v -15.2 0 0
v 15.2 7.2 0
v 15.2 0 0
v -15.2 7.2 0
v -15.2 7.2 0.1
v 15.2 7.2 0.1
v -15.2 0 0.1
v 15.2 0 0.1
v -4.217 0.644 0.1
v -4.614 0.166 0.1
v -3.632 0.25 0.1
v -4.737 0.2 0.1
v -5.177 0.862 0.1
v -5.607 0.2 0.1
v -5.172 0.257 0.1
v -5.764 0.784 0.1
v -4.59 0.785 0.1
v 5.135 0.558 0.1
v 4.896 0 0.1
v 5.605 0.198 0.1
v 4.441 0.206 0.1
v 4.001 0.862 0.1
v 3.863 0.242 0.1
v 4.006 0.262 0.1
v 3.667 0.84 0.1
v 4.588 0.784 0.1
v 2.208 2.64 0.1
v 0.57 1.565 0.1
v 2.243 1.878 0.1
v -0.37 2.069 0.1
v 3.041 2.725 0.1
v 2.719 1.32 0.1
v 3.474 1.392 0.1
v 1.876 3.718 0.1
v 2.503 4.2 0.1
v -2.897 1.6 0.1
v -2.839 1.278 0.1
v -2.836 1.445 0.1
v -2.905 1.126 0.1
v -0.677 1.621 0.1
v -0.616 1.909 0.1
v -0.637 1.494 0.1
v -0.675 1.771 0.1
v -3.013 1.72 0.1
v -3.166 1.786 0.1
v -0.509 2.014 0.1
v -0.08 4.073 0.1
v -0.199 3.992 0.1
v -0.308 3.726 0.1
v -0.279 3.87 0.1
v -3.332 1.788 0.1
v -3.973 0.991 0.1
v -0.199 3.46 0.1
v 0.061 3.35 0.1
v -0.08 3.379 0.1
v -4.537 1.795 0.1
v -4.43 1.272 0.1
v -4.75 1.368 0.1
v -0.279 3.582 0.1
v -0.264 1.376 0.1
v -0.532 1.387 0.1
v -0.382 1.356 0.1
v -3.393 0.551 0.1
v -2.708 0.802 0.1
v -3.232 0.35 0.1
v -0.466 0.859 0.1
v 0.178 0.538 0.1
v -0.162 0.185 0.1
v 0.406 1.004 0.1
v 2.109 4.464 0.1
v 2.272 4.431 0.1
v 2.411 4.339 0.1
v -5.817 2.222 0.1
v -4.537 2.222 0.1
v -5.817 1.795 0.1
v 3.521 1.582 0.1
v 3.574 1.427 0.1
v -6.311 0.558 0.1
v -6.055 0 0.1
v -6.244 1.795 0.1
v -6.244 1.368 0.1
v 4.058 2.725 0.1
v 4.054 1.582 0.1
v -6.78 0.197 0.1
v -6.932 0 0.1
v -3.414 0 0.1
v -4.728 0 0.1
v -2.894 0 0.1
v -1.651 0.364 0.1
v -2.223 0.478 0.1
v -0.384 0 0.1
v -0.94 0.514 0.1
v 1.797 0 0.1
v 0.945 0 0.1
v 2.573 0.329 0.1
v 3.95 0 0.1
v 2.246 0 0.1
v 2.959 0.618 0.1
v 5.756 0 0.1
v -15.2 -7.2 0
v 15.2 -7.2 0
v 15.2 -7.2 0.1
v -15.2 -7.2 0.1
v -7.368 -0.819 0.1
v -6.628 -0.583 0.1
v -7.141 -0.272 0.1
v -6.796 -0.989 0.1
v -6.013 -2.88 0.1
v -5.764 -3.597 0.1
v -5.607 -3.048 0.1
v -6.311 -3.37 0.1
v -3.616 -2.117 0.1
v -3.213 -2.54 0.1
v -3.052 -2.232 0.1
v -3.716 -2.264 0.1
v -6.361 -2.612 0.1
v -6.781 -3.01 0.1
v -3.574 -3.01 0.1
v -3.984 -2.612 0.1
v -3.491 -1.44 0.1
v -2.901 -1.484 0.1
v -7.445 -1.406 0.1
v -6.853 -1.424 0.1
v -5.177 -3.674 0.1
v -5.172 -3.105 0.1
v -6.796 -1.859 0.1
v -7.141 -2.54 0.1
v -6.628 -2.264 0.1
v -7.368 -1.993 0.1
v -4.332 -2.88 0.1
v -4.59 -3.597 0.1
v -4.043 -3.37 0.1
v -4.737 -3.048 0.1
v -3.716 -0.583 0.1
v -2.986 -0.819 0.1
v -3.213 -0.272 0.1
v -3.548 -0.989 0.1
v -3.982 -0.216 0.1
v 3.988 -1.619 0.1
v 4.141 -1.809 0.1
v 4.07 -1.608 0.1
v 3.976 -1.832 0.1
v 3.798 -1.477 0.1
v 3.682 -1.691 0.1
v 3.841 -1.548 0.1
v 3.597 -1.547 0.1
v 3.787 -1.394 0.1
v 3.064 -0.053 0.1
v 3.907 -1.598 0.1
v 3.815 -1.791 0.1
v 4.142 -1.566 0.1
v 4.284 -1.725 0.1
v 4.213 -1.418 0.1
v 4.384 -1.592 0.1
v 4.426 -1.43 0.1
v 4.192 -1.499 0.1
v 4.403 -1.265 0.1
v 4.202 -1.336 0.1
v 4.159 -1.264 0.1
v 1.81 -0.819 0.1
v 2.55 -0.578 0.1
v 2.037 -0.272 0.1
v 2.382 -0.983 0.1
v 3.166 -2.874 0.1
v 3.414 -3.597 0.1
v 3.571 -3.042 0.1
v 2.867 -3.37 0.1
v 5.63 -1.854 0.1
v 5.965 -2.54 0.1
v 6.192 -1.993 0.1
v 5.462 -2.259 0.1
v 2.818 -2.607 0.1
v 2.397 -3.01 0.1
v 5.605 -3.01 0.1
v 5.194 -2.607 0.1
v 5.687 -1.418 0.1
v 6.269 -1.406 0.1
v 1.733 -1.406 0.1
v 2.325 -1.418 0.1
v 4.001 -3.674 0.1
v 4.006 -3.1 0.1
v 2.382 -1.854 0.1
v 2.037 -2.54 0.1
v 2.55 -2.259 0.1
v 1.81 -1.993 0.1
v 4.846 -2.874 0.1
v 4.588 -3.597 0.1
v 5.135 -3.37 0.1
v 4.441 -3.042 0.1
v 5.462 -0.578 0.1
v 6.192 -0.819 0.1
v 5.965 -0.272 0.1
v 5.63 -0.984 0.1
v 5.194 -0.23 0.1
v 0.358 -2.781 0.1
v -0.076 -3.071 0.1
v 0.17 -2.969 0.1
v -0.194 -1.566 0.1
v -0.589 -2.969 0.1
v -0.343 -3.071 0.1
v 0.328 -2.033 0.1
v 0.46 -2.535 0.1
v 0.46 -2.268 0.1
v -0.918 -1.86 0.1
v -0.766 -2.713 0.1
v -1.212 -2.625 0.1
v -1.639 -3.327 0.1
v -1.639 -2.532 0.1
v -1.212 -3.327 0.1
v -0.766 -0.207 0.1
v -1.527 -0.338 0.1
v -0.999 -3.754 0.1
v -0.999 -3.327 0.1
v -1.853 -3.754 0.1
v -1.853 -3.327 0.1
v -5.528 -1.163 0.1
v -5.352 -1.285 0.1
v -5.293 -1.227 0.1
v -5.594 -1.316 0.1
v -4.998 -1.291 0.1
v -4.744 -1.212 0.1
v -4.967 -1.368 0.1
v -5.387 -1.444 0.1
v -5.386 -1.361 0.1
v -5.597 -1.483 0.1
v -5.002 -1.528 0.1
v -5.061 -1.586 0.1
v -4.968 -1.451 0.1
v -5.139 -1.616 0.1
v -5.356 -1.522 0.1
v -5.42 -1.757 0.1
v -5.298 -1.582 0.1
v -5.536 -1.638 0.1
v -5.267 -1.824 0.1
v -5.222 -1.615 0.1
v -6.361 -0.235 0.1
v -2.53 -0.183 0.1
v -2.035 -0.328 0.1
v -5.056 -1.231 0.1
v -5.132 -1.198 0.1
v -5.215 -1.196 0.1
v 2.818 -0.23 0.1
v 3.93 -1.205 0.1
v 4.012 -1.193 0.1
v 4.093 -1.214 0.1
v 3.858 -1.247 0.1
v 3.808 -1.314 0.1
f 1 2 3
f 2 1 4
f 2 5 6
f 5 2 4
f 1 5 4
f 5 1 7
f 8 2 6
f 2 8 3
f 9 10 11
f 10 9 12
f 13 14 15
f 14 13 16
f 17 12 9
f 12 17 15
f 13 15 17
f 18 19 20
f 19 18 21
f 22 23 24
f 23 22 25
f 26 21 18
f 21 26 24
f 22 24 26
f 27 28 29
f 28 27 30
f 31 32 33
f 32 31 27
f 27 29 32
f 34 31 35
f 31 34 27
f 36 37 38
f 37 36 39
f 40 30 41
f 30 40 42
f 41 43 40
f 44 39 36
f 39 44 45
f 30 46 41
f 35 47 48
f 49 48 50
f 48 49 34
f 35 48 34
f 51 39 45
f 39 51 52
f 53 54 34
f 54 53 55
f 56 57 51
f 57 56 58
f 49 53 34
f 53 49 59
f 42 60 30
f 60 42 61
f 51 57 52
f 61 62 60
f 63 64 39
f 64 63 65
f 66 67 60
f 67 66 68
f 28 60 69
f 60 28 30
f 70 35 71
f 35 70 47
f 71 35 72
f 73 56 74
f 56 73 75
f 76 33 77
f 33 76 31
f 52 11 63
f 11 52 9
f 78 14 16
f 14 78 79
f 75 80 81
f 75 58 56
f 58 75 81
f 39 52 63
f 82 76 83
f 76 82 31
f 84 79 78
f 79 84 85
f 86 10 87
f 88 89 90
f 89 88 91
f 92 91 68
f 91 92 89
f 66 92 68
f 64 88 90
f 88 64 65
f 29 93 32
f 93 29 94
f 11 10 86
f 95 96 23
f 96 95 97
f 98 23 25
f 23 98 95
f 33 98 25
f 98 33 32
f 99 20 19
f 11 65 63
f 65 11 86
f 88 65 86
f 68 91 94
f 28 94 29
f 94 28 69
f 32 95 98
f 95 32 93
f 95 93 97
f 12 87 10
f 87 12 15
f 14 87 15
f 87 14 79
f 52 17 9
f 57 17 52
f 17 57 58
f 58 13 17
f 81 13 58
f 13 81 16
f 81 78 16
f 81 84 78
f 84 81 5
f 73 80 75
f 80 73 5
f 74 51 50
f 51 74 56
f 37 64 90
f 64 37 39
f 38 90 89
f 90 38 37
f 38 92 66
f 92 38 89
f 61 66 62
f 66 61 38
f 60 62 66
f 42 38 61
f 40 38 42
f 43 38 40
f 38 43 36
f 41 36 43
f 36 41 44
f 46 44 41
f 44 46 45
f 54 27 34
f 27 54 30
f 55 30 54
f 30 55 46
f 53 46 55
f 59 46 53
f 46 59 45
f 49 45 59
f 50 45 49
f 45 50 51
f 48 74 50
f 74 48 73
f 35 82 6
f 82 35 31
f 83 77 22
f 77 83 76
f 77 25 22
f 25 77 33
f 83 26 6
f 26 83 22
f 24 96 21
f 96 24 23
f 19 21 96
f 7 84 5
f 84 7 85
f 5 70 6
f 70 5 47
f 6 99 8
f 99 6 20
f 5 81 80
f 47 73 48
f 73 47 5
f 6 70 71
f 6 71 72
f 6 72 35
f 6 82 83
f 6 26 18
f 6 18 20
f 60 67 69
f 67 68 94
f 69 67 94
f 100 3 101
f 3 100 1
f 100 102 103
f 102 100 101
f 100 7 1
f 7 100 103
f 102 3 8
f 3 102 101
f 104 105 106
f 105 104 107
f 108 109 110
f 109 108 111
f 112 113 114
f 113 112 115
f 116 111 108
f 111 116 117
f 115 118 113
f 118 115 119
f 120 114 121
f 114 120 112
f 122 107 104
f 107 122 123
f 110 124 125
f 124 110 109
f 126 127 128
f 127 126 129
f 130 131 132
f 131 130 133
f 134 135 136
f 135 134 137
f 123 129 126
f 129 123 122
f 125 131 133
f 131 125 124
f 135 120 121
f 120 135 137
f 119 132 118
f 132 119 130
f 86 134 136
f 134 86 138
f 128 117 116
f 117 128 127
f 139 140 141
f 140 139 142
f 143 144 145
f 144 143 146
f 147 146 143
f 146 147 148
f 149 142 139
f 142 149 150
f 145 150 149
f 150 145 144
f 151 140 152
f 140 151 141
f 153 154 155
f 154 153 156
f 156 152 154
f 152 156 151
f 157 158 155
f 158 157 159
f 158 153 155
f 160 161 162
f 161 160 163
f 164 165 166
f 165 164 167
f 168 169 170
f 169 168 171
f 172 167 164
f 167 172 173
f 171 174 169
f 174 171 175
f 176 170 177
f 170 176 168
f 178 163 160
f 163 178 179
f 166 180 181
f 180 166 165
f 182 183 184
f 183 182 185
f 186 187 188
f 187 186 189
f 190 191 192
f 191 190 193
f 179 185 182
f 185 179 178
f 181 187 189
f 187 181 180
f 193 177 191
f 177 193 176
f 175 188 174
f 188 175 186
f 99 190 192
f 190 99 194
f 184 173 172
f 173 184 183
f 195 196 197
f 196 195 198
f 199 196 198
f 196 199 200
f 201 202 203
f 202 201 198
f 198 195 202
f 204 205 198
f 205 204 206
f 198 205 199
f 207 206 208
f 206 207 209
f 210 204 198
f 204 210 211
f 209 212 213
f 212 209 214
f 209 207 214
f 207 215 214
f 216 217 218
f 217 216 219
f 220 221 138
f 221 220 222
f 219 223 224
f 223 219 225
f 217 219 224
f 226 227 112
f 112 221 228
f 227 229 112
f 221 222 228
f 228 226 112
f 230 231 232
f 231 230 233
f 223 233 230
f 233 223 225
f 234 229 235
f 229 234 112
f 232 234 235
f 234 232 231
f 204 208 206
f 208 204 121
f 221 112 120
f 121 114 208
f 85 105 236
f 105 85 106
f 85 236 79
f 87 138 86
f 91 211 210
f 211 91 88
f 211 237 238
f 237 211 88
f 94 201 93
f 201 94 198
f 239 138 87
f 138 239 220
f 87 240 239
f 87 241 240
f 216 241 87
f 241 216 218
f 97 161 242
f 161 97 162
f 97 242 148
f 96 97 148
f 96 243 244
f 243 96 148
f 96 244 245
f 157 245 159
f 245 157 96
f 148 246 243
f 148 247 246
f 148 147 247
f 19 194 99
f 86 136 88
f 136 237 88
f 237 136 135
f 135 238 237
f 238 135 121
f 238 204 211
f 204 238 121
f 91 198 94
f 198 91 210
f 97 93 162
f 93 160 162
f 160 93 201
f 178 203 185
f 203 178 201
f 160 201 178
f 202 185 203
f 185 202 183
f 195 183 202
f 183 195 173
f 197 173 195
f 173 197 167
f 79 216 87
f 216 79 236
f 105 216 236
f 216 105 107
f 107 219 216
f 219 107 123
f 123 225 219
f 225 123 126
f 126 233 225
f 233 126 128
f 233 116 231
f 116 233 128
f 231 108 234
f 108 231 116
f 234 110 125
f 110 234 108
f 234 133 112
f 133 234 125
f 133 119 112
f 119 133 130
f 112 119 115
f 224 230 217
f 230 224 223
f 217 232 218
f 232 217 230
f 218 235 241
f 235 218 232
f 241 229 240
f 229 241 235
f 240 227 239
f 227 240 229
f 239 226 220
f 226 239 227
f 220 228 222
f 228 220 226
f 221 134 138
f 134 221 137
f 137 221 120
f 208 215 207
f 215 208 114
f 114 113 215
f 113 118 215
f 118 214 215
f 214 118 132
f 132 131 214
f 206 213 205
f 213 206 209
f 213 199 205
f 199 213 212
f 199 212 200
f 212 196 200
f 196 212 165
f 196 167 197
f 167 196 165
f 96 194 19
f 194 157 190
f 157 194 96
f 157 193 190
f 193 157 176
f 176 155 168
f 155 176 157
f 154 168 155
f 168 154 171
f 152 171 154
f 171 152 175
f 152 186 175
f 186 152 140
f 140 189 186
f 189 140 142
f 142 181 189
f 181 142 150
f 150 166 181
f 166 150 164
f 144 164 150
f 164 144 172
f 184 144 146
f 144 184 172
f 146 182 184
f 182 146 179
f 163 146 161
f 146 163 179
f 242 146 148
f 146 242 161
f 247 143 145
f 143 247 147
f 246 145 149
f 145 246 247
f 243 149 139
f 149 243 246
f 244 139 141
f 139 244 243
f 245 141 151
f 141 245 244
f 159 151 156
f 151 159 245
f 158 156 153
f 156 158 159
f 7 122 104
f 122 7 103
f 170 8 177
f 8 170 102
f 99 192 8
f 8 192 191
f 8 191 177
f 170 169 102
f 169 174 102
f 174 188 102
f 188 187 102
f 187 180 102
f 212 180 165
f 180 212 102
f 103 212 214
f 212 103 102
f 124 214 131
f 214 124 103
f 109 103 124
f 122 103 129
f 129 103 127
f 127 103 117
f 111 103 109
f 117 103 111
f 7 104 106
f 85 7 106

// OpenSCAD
// file: ../p/box4-12.scad
use <../lib.scad>
function ldraw_lib__box4_12() = [
// 0 Box with 4 Faces without Any Edges
// 0 Name: box4-12.dat
// 0 Author: J.C. Tchang [tchang]
// 0 !LDRAW_ORG Primitive UPDATE 2019-01
// 0 !LICENSE Licensed under CC BY 2.0 and CC BY 4.0 : see CAreadme.txt
// 
// 0 BFC CERTIFY CCW
  [0,"BFC","CERTIFY"],
  [0,"BFC","CCW"],
// 
// 0 !HISTORY 2019-06-28 [PTadmin] Official Update 2019-01
// 
// 
// 4 16 -1 1 1 1 1 1 1 1 -1 -1 1 -1
  [4,16,-1,1,1,1,1,1,1,1,-1,-1,1,-1],
// 4 16 -1 1 1 -1 0 1 1 0 1 1 1 1
  [4,16,-1,1,1,-1,0,1,1,0,1,1,1,1],
// 4 16 -1 1 -1 -1 0 -1 -1 0 1 -1 1 1
  [4,16,-1,1,-1,-1,0,-1,-1,0,1,-1,1,1],
// 4 16 1 1 1 1 0 1 1 0 -1 1 1 -1
  [4,16,1,1,1,1,0,1,1,0,-1,1,1,-1],
];
module ldraw_lib__box4_12(step=0, col=false, unit=2/5, alt=false, line=0.2, solid=!$preview)
    makepoly(ldraw_lib__box4_12(), step=step, col=col, unit=unit, alt=alt, line=line, solid=solid);
ldraw_lib__box4_12(line=0.2);
// main file
use <../lib.scad>
use <s/6109079bs01.scad>
use <s/6109079bs02.scad>
function ldraw_lib__6109079b() = [
// 0 Sticker  1.8 x  3.8 with Lime Bicycle Icon
// 0 Name: 6109079b.dat
// 0 Author: Gerald Lasser [GeraldLasser]
// 0 !LDRAW_ORG Part UPDATE 2020-03
// 0 !LICENSE Licensed under CC BY 2.0 and CC BY 4.0 : see CAreadme.txt
// 
// 0 BFC CERTIFY CCW
  [0,"BFC","CERTIFY"],
  [0,"BFC","CCW"],
// 
// 0 !KEYWORDS Set 60097
// 
// 0 !HISTORY 2020-12-29 [PTadmin] Official Update 2020-03
// 
// 
// 1 16 0 0 0 1 0 0 0 1 0 0 0 1 s\6109079bs01.dat
  [1,16,0,0,0,1,0,0,0,1,0,0,0,1, ldraw_lib__s__6109079bs01()],
// 1 16 0 0 0 1 0 0 0 1 0 0 0 1 s\6109079bs02.dat
  [1,16,0,0,0,1,0,0,0,1,0,0,0,1, ldraw_lib__s__6109079bs02()],
];
module ldraw_lib__6109079b(step=0, col=false, unit=2/5, alt=false, line=0.2, solid=!$preview)
    makepoly(ldraw_lib__6109079b(), step=step, col=col, unit=unit, alt=alt, line=line, solid=solid);
ldraw_lib__6109079b(line=0.2);
